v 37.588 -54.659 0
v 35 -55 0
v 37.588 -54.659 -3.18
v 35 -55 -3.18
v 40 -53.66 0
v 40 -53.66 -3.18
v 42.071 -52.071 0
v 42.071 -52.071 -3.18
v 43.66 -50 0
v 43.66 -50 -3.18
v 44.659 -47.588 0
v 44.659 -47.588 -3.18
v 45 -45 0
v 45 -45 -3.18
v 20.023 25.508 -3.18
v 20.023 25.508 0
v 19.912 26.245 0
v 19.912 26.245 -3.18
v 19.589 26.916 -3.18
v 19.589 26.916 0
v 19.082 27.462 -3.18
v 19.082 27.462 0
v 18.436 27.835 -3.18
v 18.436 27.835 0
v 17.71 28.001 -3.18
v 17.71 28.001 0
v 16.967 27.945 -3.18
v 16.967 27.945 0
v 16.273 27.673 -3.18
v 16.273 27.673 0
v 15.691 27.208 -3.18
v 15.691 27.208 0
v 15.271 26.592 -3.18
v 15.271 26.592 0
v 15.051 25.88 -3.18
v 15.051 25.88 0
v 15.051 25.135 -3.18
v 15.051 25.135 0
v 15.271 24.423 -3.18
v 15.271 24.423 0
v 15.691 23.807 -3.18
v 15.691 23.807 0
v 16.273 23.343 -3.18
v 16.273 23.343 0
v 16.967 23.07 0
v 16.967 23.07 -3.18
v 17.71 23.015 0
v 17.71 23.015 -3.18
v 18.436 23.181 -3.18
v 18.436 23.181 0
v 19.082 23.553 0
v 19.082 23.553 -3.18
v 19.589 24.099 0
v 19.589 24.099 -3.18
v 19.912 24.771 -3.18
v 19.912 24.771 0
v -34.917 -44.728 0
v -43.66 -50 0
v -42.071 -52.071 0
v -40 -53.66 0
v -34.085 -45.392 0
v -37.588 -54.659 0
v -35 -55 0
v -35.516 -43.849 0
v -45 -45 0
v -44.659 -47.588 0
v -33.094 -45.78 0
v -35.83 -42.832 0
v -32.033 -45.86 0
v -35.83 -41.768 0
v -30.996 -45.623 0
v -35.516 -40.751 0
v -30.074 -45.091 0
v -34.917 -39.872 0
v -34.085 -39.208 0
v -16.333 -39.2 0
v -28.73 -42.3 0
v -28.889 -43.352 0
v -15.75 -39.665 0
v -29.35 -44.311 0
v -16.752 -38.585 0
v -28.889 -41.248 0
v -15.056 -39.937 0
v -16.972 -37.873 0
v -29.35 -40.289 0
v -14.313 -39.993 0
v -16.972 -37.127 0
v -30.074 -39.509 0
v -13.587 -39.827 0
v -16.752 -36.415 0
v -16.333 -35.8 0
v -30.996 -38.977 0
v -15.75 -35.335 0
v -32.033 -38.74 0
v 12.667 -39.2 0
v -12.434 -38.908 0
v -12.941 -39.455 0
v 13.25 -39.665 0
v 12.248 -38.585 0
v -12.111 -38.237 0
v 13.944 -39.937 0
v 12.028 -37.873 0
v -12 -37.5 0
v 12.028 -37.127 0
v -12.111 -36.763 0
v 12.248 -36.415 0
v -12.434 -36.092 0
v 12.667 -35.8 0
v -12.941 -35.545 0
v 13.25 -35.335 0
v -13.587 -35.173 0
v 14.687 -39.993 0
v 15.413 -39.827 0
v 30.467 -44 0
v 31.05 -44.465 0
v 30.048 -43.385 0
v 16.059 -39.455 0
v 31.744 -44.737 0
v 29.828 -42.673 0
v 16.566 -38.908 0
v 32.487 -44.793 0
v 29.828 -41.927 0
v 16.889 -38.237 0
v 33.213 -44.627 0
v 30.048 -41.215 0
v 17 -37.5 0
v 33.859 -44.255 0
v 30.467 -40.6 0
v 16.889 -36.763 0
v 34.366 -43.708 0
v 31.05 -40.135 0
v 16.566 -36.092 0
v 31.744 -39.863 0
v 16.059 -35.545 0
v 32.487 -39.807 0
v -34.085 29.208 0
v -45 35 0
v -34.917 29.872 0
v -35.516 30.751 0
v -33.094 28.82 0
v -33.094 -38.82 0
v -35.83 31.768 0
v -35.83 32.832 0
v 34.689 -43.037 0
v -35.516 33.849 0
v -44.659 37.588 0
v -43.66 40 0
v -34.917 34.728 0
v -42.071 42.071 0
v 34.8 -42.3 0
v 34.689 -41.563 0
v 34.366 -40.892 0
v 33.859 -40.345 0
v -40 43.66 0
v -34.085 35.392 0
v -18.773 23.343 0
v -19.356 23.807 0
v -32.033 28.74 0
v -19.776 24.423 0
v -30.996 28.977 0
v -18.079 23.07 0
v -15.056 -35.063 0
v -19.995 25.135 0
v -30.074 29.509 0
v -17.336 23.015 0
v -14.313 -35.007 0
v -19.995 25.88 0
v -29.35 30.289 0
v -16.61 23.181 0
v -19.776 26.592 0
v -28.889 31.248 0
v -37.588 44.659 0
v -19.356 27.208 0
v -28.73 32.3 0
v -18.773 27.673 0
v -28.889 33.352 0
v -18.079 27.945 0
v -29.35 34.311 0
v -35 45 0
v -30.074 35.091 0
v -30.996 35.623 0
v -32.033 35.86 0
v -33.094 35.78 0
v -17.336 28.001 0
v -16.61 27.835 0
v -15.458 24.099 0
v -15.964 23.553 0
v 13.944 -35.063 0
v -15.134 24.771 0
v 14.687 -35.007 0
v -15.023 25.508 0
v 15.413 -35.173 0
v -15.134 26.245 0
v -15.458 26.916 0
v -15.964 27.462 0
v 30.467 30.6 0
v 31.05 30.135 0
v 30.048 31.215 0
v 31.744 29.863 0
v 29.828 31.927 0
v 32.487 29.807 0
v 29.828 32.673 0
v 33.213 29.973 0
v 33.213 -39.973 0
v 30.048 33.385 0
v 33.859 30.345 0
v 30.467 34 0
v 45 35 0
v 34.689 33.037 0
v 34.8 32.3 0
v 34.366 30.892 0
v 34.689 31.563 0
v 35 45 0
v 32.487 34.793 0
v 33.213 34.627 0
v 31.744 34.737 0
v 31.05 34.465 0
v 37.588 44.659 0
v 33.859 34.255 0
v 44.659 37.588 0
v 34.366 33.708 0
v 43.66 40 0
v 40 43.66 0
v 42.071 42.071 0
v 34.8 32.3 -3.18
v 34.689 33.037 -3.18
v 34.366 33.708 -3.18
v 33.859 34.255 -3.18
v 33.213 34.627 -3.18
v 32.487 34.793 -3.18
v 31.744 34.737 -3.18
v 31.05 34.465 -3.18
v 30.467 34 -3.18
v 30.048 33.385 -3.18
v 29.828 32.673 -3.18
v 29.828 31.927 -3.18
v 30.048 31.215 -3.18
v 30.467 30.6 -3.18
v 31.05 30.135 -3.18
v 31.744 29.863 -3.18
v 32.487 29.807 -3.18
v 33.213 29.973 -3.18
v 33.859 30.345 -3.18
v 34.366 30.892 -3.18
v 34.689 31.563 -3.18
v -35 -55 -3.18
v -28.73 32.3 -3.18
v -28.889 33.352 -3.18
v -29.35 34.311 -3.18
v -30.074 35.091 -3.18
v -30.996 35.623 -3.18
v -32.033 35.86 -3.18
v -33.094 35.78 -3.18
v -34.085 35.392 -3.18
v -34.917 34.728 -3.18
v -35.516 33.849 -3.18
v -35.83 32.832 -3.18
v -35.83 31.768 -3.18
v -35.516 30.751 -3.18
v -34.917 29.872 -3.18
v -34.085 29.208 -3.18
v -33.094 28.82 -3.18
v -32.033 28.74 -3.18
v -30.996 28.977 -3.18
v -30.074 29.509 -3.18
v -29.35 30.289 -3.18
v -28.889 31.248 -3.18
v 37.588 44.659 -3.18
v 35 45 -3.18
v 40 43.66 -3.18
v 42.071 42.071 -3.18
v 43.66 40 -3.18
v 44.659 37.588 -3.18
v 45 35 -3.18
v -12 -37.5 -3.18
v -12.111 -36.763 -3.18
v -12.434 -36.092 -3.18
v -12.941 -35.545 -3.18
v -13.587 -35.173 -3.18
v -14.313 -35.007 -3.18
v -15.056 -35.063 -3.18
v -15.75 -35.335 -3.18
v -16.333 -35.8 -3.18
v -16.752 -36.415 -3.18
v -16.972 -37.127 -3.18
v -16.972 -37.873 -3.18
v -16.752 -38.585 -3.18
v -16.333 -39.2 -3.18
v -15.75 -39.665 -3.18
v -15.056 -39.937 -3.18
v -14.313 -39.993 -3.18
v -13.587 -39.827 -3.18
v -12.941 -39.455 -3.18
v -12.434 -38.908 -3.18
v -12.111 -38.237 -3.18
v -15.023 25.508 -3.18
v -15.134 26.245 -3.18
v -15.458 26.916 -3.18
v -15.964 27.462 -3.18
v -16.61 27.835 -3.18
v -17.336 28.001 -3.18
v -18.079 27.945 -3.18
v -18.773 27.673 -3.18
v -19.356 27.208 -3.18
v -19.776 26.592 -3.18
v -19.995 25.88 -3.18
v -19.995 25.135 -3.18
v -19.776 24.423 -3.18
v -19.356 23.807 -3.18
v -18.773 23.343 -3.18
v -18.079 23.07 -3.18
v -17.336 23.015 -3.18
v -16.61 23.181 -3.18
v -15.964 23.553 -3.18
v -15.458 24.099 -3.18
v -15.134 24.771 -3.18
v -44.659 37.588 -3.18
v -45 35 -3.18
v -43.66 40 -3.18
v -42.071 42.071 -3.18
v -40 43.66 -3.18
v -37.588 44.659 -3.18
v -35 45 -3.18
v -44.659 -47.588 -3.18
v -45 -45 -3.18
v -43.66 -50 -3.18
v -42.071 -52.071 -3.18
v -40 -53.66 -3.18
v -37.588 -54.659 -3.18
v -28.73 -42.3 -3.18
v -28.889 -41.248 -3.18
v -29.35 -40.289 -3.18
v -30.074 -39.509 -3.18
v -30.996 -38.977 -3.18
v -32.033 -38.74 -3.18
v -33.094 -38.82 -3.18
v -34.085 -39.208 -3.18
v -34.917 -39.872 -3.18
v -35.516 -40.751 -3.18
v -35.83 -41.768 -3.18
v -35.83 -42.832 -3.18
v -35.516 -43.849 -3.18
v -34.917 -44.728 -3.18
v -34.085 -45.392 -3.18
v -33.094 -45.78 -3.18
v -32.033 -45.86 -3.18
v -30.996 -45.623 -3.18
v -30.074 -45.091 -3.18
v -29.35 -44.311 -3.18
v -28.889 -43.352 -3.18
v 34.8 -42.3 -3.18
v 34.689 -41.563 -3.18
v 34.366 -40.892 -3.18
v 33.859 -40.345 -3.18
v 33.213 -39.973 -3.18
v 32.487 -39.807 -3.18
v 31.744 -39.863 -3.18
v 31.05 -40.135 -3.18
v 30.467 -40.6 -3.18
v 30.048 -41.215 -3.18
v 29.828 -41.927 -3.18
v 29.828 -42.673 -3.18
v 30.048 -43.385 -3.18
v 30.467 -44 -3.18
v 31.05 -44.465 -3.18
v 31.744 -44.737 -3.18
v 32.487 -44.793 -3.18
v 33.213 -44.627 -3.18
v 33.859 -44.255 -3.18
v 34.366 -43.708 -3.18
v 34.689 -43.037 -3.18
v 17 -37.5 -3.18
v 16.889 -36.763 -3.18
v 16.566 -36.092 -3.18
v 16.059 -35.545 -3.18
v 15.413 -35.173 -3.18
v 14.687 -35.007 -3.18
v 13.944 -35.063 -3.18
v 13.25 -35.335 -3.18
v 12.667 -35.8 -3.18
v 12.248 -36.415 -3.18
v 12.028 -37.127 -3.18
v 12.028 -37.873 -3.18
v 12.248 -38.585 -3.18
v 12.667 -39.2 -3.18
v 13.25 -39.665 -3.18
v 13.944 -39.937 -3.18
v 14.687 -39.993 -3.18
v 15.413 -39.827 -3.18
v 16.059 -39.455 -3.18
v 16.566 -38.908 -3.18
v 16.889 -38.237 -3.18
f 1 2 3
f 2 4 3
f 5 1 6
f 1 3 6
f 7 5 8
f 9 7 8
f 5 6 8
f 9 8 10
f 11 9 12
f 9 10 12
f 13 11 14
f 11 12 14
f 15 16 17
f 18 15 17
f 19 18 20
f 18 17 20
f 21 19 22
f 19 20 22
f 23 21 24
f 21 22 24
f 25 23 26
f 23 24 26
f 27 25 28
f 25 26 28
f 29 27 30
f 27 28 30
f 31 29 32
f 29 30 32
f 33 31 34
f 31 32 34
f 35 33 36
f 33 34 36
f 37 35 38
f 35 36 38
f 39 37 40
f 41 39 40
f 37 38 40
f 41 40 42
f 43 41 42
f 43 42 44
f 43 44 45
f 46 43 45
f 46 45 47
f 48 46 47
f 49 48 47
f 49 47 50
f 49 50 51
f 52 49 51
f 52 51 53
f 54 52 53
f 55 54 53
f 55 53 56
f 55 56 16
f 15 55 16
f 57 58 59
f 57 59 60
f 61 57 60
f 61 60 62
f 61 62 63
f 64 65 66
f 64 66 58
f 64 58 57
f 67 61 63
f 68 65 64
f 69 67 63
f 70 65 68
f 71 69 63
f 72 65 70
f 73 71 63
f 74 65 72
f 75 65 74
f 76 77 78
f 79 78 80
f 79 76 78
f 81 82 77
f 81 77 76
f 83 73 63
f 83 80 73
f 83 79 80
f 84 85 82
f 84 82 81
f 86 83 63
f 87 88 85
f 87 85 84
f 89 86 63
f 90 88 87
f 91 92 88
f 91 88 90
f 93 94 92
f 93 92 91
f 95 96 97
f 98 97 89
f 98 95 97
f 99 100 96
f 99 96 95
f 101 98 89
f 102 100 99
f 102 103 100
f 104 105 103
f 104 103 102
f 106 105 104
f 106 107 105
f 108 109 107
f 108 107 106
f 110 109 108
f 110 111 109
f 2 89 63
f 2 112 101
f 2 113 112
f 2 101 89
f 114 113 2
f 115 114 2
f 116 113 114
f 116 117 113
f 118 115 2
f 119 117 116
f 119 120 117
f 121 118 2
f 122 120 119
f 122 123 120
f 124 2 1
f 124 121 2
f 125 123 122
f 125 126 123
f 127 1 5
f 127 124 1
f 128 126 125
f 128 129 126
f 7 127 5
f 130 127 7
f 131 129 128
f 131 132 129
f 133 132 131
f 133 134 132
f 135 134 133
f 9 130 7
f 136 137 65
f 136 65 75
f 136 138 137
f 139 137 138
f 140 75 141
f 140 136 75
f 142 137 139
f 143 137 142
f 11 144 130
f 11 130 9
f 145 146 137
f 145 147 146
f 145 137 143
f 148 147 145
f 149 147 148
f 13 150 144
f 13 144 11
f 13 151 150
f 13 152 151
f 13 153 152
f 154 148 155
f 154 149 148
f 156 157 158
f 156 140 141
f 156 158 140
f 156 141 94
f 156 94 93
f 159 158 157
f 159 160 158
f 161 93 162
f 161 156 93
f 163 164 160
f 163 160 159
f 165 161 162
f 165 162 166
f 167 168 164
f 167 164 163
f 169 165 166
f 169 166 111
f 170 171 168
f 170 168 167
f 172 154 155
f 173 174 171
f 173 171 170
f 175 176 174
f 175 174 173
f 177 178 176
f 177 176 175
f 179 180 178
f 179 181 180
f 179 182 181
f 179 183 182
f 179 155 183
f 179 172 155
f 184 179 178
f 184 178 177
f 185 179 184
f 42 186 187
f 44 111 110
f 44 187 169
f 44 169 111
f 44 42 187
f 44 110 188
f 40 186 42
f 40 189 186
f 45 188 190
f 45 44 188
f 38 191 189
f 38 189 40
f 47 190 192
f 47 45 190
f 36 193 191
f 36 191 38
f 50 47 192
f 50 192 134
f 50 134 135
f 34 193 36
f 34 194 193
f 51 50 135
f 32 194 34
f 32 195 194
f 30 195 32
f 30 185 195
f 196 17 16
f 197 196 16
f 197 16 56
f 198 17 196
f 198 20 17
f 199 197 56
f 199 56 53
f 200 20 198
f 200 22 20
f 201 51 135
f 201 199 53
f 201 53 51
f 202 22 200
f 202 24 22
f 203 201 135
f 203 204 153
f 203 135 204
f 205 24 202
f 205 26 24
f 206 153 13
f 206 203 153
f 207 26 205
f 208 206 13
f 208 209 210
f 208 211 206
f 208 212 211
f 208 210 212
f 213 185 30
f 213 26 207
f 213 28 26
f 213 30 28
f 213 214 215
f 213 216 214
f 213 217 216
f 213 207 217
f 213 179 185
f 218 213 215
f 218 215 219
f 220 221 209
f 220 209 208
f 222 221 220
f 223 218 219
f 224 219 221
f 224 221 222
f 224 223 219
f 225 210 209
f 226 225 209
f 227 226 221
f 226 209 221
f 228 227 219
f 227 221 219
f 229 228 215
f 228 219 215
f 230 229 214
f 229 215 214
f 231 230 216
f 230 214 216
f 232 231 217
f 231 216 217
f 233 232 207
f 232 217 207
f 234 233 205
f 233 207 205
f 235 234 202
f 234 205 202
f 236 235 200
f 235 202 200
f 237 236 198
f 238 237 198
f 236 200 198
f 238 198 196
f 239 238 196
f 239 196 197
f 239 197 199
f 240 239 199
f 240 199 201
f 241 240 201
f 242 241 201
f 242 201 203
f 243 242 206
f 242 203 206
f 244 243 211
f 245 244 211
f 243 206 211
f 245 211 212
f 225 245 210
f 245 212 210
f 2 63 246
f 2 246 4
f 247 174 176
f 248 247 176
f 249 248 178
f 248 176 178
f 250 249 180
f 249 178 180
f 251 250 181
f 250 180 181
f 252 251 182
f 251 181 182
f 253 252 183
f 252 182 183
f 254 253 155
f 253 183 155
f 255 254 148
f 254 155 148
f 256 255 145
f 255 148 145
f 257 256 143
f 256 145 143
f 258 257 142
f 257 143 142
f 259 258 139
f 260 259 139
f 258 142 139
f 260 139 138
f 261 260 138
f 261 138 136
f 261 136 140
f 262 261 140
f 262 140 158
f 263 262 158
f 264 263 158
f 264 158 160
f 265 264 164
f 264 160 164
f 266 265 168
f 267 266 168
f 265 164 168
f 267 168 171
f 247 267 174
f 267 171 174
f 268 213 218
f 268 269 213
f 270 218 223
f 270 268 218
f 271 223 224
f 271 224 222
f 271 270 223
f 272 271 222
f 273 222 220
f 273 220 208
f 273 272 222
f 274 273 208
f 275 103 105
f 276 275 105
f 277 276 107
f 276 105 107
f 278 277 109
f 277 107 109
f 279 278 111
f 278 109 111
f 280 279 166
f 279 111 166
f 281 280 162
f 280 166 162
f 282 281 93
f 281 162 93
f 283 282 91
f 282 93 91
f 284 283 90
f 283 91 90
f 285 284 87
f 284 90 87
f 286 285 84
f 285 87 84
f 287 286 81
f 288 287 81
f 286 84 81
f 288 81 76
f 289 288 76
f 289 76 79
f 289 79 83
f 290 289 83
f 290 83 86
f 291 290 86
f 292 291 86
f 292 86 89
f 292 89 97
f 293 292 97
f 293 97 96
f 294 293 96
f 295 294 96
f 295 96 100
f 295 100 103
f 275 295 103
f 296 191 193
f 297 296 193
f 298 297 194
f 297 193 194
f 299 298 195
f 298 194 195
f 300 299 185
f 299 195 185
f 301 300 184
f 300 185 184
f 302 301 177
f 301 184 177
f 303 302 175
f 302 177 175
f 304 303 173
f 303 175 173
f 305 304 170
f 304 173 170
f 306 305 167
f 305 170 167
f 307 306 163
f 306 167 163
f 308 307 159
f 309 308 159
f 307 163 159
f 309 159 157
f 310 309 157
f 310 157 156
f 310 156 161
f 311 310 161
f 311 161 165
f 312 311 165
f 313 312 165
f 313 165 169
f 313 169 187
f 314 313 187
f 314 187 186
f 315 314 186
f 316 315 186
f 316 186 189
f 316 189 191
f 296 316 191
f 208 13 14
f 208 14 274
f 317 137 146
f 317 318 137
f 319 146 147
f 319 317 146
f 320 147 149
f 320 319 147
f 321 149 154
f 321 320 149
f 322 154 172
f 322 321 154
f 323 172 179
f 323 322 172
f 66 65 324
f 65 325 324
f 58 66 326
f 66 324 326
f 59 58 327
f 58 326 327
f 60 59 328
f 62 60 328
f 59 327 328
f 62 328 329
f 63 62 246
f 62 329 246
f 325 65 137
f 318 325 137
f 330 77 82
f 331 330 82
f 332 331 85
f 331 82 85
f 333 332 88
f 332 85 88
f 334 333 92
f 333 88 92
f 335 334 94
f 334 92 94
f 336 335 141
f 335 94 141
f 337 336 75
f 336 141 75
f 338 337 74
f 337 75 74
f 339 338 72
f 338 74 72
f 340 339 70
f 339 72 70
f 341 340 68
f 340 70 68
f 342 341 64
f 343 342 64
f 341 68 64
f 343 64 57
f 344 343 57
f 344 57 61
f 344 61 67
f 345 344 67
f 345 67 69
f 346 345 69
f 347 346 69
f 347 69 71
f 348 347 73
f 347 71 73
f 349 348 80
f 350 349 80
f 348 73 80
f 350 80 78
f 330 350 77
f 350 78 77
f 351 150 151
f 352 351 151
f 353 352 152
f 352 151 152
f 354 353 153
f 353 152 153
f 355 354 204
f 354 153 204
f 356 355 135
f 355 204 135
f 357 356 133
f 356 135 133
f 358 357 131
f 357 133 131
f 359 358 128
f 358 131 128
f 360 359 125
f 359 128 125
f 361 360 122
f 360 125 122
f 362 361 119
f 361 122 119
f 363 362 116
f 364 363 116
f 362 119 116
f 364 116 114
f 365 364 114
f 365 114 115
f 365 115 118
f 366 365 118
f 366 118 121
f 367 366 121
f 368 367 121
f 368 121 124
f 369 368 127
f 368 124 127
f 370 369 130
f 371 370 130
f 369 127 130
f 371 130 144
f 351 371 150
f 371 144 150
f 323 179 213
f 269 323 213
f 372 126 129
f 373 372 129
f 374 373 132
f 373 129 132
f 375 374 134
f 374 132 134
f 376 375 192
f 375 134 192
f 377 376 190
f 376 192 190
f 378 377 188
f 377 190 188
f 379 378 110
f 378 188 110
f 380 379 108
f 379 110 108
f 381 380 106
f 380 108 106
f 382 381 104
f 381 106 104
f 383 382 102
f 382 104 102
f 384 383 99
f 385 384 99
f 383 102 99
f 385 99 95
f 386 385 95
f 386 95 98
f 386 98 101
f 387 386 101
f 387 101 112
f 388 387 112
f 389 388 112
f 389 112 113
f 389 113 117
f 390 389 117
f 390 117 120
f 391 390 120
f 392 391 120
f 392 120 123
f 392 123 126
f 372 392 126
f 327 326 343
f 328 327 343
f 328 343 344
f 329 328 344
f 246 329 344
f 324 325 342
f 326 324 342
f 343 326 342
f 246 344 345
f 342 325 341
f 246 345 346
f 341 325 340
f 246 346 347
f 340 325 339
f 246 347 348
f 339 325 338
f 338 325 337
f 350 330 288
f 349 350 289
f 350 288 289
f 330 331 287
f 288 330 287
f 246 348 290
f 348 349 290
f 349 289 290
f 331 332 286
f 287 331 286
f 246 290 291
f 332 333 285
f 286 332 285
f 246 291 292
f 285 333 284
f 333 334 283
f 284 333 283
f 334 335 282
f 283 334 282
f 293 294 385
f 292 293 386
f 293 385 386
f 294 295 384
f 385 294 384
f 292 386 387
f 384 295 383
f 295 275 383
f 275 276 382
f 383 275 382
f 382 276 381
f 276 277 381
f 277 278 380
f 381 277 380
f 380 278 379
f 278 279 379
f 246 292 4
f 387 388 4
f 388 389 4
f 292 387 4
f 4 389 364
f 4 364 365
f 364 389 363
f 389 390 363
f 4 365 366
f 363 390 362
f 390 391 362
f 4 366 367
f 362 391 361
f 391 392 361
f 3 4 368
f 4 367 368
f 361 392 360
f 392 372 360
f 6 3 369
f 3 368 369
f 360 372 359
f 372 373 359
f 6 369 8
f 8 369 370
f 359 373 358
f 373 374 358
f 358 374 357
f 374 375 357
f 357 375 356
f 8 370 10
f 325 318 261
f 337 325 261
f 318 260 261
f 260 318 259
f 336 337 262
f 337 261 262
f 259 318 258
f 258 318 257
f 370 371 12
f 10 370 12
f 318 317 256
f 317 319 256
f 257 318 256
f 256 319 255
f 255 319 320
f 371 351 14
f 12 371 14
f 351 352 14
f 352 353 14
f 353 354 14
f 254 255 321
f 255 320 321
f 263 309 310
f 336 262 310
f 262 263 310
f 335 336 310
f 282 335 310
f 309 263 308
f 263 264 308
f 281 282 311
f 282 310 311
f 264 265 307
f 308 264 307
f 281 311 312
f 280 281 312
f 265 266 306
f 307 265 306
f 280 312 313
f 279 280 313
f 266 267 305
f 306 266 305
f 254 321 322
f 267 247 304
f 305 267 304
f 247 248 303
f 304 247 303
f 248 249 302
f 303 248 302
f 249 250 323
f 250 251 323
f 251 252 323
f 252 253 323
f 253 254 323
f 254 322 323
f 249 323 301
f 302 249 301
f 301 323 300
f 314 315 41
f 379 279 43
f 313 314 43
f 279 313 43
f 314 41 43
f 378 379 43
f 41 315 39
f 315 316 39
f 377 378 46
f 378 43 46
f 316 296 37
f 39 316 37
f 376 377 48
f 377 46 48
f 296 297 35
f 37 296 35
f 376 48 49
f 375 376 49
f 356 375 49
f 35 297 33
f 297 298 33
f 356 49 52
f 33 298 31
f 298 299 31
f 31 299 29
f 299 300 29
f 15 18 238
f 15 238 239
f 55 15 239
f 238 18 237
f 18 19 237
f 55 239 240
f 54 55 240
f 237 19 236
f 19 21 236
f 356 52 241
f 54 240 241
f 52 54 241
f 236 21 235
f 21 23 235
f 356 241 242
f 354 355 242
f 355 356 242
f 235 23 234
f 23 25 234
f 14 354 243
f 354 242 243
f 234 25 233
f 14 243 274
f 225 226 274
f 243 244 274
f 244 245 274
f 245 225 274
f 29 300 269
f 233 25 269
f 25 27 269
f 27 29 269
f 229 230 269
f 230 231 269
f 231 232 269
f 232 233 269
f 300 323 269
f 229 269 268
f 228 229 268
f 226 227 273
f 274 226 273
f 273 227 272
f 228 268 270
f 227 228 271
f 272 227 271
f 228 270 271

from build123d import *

# Parameters (mm, degrees)
SKETCH1_W           = 90
SKETCH1_H           = 100
SKETCH1_R           = 2.5
SKETCH1_R_2         = 3.57
BOSS_EXTRUDE1_DEPTH = 3.18
FILLET1_R           = 10
SKETCH2_R           = 2.5
CUT_EXTRUDE1_DEPTH  = 10


with BuildPart() as part:
    # Sketch1 → Boss-Extrude1 (new body)
    with BuildSketch(Plane.XY):
        with Locations((0, -5)):
            Rectangle(SKETCH1_W, SKETCH1_H)
        with Locations((32.3, -42.3)):
            Circle(SKETCH1_R, mode=Mode.SUBTRACT)
        with Locations((-32.3, -42.3)):
            Circle(SKETCH1_R_2, mode=Mode.SUBTRACT)
        with Locations((-32.3, 32.3)):
            Circle(SKETCH1_R_2, mode=Mode.SUBTRACT)
        with Locations((32.3, 32.3)):
            Circle(SKETCH1_R, mode=Mode.SUBTRACT)
    extrude(amount=-BOSS_EXTRUDE1_DEPTH)

    # Fillet1
    fillet1_edges = [part.edges().sort_by_distance(p)[0] for p in [
        (-45, 45, -1.59),
        (45, 45, -1.59),
        (45, -55, -1.59),
        (-45, -55, -1.59),
    ]]
    fillet(fillet1_edges, radius=FILLET1_R)

    # Sketch2 → Cut-Extrude1 (cut)
    with BuildSketch(Plane.XY):
        with Locations((-14.5, -37.5)):
            Circle(SKETCH2_R)
        with Locations((14.5, -37.5)):
            Circle(SKETCH2_R)
        with Locations((-17.523146435, 25.507758855)):
            Circle(SKETCH2_R)
        with Locations((17.523146435, 25.507758855)):
            Circle(SKETCH2_R)
    extrude(amount=-CUT_EXTRUDE1_DEPTH, mode=Mode.SUBTRACT)


solid = part.part
